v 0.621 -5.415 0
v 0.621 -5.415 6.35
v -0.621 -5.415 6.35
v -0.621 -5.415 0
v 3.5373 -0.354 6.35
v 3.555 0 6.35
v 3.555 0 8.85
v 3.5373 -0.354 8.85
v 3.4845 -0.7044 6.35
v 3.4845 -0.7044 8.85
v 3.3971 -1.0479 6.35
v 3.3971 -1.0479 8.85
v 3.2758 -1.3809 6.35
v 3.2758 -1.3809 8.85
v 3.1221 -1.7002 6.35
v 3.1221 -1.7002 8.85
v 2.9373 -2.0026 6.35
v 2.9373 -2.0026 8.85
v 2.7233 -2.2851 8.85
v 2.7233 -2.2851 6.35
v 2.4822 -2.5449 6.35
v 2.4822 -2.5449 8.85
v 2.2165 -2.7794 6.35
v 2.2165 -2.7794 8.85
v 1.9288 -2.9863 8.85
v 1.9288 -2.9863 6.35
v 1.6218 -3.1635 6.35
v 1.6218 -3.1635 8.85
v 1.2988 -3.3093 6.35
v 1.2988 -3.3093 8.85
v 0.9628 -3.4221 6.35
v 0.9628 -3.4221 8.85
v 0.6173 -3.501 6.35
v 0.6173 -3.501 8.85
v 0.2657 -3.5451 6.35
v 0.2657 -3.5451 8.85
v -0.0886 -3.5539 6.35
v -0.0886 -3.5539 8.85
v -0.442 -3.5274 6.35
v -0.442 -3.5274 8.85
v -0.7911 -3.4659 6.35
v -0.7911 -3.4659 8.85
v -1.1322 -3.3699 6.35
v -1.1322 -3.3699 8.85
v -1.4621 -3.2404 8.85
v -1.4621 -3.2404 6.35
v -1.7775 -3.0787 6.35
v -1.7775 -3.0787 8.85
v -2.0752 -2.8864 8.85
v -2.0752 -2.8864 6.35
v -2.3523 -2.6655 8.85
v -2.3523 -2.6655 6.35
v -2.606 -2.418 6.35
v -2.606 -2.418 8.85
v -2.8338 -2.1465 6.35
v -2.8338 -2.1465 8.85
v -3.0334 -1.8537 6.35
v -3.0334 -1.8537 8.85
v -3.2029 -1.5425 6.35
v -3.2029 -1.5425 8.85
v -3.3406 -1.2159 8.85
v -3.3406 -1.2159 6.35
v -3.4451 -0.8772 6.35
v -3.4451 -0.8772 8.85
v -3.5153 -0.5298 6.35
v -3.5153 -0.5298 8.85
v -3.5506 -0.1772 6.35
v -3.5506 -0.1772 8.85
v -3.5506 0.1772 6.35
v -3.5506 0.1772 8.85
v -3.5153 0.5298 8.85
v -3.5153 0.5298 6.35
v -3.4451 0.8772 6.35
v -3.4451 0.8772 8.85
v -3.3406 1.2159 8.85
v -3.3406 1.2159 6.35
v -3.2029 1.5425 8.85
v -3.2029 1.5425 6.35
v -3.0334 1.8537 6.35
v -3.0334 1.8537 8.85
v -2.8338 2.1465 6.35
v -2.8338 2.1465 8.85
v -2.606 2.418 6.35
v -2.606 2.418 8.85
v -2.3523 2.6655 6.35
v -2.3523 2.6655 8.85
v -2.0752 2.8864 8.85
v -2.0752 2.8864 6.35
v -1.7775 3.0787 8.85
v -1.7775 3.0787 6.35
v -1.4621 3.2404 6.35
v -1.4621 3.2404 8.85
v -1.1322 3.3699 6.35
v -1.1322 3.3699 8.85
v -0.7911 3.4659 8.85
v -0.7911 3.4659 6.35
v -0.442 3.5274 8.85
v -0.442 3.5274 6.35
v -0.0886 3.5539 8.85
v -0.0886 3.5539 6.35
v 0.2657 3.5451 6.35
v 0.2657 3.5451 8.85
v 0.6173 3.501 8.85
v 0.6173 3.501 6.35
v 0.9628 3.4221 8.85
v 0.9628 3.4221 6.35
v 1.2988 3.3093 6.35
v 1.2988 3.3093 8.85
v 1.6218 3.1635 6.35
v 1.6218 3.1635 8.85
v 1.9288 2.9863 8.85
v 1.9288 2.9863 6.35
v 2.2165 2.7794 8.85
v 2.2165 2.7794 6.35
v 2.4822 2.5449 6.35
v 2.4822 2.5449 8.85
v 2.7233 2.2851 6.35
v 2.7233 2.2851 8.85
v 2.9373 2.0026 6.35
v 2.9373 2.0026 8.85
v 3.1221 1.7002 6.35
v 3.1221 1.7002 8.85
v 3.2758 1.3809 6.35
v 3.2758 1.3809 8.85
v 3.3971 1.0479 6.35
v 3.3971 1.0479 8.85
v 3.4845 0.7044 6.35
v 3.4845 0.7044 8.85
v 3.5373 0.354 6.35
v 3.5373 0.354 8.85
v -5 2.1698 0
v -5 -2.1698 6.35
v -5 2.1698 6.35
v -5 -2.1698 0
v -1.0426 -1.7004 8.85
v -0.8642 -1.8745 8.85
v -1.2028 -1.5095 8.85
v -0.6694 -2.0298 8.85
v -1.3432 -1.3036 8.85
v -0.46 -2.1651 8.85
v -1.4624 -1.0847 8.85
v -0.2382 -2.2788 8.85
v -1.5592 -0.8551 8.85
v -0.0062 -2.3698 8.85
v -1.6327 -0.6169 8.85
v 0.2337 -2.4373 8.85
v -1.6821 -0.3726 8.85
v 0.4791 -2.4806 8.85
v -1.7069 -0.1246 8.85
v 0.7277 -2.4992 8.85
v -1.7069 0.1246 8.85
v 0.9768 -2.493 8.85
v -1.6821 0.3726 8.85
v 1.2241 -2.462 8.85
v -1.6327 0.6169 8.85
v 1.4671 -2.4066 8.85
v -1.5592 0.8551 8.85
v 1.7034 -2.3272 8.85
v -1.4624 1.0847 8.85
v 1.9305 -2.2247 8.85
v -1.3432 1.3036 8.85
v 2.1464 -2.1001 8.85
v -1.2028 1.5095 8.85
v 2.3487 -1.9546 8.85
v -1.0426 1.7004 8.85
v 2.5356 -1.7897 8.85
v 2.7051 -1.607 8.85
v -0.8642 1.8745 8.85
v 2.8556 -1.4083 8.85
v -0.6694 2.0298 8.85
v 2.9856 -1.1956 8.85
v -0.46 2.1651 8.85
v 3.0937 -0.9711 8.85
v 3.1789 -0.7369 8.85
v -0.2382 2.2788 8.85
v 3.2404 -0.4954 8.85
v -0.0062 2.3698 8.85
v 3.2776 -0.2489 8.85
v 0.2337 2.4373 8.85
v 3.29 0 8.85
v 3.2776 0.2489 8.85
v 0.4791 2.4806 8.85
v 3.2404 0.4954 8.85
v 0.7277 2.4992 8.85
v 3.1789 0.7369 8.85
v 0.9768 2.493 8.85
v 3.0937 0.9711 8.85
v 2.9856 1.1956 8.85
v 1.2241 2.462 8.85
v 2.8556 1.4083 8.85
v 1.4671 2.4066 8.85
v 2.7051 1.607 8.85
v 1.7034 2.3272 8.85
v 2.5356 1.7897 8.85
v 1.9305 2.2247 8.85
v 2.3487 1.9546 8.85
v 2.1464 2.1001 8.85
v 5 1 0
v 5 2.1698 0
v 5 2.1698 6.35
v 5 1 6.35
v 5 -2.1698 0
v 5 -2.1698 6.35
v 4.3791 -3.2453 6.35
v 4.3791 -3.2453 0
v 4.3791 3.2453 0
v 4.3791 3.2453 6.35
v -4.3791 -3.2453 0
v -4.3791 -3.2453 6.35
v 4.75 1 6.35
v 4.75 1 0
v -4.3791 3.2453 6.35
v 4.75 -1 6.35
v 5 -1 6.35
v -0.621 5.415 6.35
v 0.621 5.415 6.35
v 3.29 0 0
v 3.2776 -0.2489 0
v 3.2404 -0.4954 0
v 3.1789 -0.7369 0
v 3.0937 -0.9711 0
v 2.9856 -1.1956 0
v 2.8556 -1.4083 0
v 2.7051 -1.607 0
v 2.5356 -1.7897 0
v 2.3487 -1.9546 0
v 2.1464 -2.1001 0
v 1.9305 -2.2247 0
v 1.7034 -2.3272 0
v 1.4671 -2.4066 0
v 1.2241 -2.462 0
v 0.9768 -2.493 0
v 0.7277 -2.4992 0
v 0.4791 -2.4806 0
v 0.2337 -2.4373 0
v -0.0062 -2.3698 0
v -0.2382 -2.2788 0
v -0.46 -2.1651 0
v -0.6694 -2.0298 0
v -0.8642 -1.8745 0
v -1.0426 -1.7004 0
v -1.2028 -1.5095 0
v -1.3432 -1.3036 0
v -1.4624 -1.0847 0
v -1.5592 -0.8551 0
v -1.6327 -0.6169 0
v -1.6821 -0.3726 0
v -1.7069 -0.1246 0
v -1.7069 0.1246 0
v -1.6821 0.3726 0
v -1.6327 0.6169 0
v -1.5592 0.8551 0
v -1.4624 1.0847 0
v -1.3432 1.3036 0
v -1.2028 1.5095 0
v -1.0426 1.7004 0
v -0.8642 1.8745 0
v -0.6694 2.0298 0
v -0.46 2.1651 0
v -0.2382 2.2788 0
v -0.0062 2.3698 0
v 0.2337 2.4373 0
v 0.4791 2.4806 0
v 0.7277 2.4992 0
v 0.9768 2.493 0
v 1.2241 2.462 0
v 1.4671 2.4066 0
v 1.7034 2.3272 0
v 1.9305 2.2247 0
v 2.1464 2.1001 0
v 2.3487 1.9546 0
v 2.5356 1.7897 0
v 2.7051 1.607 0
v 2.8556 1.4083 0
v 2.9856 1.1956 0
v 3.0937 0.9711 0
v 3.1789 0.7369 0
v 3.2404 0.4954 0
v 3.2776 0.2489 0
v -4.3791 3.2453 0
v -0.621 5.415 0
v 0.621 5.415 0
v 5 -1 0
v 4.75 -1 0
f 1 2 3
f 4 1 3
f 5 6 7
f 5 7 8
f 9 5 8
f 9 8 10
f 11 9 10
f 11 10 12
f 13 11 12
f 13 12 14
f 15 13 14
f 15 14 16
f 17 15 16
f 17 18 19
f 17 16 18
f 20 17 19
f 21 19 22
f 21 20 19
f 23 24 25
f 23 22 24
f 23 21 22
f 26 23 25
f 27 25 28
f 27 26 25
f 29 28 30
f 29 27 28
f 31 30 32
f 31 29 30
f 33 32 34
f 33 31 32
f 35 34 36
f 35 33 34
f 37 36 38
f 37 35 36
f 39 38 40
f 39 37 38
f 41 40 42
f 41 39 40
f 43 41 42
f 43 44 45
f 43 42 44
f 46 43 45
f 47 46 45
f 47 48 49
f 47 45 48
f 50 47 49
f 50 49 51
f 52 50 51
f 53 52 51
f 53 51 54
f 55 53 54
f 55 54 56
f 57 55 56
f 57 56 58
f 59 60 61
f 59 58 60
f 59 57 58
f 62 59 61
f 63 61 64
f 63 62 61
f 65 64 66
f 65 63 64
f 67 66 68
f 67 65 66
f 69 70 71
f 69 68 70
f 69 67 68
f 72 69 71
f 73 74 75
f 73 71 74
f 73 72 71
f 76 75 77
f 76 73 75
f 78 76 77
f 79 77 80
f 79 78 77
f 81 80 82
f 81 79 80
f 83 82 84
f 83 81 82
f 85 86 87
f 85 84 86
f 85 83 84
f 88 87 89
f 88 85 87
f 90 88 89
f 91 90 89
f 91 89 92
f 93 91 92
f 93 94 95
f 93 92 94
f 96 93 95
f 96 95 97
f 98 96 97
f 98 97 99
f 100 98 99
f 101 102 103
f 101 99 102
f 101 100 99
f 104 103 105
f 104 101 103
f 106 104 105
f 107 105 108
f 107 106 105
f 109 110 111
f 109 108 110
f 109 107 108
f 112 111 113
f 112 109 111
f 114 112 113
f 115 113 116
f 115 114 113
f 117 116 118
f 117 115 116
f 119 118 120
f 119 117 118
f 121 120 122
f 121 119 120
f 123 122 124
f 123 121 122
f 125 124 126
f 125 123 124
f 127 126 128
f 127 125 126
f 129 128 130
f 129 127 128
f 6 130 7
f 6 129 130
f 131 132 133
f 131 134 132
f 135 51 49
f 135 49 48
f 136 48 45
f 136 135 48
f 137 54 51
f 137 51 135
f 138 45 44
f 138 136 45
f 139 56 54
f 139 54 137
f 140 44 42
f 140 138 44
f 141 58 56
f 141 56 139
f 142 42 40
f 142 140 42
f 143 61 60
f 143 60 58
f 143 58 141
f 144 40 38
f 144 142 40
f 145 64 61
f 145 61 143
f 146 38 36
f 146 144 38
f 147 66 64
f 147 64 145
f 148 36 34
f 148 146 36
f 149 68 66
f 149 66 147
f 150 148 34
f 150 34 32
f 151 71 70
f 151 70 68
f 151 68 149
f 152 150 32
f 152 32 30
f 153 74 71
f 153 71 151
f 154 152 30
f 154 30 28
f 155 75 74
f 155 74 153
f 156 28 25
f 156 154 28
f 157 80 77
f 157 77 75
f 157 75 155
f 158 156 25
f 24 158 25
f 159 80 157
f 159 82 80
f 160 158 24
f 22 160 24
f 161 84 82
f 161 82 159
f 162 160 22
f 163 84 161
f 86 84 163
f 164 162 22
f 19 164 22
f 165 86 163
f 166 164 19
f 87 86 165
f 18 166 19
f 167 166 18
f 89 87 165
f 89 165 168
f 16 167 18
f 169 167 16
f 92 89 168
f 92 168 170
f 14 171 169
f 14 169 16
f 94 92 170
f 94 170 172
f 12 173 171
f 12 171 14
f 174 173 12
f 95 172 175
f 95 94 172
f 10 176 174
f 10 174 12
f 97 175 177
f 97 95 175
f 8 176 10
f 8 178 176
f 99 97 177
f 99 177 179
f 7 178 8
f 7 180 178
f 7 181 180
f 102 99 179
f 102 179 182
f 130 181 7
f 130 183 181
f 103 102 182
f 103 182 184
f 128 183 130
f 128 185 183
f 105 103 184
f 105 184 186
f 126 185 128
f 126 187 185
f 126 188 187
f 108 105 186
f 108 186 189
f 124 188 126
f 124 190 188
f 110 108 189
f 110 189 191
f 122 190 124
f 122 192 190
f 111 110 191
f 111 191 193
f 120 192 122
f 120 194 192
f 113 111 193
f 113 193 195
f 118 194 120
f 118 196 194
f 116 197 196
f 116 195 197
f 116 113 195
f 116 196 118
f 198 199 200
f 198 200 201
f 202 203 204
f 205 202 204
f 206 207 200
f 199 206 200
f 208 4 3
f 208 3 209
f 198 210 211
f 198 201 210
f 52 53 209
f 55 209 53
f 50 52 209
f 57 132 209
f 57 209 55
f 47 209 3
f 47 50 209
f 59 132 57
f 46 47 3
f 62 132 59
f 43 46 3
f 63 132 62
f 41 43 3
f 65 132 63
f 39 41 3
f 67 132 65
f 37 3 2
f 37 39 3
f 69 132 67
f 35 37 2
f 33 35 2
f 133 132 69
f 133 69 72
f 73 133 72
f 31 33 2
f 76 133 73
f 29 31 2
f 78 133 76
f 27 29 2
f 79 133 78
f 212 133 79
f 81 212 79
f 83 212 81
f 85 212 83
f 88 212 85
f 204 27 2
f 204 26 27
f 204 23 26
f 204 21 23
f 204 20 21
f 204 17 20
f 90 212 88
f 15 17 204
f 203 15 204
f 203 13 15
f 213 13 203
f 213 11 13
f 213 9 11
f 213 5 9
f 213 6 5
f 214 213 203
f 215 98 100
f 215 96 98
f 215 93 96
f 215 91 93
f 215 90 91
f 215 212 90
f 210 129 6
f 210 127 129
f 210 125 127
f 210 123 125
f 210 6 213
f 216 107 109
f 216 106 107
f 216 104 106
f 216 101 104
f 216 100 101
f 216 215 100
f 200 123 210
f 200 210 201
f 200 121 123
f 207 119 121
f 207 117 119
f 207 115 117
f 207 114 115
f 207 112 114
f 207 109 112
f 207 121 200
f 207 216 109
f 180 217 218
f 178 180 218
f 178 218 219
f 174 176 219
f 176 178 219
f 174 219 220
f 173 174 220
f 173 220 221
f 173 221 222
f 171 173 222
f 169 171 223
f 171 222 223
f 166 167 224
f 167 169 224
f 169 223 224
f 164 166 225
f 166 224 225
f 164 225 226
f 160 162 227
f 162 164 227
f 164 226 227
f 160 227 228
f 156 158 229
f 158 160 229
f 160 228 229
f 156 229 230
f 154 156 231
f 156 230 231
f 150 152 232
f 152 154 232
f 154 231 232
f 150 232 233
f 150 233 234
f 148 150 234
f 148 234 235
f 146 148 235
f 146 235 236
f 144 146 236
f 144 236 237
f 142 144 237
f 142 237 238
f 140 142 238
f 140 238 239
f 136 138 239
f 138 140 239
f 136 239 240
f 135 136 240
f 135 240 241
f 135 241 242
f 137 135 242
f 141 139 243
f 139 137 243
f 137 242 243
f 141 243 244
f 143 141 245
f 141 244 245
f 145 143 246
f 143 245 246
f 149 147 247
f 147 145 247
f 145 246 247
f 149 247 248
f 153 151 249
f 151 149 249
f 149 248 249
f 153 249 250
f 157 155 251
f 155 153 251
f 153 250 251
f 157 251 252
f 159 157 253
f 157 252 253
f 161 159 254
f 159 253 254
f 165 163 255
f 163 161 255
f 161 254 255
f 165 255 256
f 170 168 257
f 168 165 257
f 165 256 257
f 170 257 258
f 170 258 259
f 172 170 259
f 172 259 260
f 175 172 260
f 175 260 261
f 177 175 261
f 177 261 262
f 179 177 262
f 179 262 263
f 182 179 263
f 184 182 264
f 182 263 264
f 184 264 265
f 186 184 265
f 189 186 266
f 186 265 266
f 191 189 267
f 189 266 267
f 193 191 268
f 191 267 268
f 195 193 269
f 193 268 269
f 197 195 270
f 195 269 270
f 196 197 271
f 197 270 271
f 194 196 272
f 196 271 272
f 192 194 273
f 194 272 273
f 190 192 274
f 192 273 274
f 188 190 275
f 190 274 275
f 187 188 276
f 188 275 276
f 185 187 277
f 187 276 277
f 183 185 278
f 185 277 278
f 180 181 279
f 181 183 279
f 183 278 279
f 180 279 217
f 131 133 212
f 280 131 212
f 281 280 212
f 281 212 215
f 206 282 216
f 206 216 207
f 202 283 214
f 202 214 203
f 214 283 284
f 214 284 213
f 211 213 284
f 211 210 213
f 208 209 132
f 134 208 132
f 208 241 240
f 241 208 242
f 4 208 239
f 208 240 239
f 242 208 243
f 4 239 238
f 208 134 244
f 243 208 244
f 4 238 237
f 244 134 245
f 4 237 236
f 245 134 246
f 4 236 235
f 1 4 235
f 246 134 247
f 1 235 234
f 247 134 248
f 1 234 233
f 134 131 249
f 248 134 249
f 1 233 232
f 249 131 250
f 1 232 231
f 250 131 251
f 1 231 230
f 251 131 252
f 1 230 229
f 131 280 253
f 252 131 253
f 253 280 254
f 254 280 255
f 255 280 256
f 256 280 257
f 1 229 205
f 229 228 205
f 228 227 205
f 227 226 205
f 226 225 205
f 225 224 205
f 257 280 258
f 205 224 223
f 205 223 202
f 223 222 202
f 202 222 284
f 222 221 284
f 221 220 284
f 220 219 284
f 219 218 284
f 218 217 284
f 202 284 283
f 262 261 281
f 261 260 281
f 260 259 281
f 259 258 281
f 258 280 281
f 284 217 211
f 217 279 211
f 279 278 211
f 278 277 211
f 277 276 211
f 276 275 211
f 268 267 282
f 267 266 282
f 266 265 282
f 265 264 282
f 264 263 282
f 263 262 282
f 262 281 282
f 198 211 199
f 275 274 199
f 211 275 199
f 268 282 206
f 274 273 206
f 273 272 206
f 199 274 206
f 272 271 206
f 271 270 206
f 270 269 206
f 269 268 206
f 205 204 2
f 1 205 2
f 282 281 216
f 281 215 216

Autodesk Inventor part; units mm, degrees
ref_plane "YZ Plane" through (0, 0, 0) normal (1, 0, 0) x (0, 1, 0)
ref_plane "XZ Plane" through (0, 0, 0) normal (0, 1, 0) x (-1, 0, 0)
ref_plane "XY Plane" through (0, 0, 0) normal (0, 0, 1) x (1, 0, 0)
sketch "Sketch1" plane through (0, 0, 0) normal (0, 0, 1) x (1, 0, 0)
  circle A0 centre (0, 0) radius 3.555
  line L0 (0, 5.7735) -> (5, 2.8868)
  line L1 (5, 2.8868) -> (5, -2.8868)
  line L2 (5, -2.8868) -> (0, -5.7735)
  line L3 (0, -5.7735) -> (-5, -2.8868)
  line L4 (-5, -2.8868) -> (-5, 2.8868)
  line L5 (-5, 2.8868) -> (0, 5.7735)
  circle A1 centre (0.79, 0) radius 2.5
  dimension "d0" = 7.11
  dimension "d2" = 10
  dimension "d3" = 5
  dimension "d4" = 0.79
extrude "Extrusion1" add sketch "Sketch1" along normal blind 6.35 contours A0 | L0 L1 L2 L3 L4 L5
sketch "Sketch2" plane through (0, 0, 6.35) normal (0, 0, 1) x (1, 0, 0)
  circle A0 centre (0.79, 0) radius 2.5 projected
  circle A1 centre (0, 0) radius 3.555
  circle A2 centre (0.79, 0) radius 2.5
  dimension "d7" = 7.11
  dimension "d9" = 5
extrude "Extrusion2" add sketch "Sketch2" along normal blind 2.5
sketch "Sketch3" plane through (5, -2.8868, 0) normal (1, 0, 0) x (0, 0, -1)
  line L0 (0, 5.7735) -> (0, 0) projected
  line L1 (-6.35, 0) -> (-6.35, 5.7735) projected
  line L2 (-6.35, 3.8868) -> (0, 3.8868)
  line L3 (0, 1.8868) -> (-6.35, 1.8868)
  line L4 (-6.35, 2.8868) -> (0, 2.8868) construction
  line L5 (-1.966, 2.8868) -> (-1.966, 3.8868) construction
  line L6 (-1.966, 2.8868) -> (-1.966, 1.8868) construction
  dimension "d13" = 2
extrude "Extrusion3" cut sketch "Sketch3" against normal blind 0.25
sketch "Sketch4" plane through (0, 0, 6.35) normal (0, 0, 1) x (1, 0, 0)
  line L0 (3.1264, 5.415) -> (6.2527, 0)
  line L1 (6.2527, 0) -> (3.1264, -5.415)
  line L2 (3.1264, -5.415) -> (-3.1264, -5.415)
  line L3 (-3.1264, -5.415) -> (-6.2527, 0)
  line L4 (-6.2527, 0) -> (-3.1264, 5.415)
  line L5 (-3.1264, 5.415) -> (3.1264, 5.415)
  line L6 (-3.1264, 5.415) -> (0, 7.4304)
  line L7 (0, 7.4304) -> (3.1264, 5.415)
  line L8 (-3.1264, 5.415) -> (-7.0189, 5.2081)
  line L9 (-7.0189, 5.2081) -> (-6.2527, 0)
  line L10 (-6.2527, 0) -> (-7.6169, -4.7381)
  line L11 (-7.6169, -4.7381) -> (-3.1264, -5.415)
  line L12 (-3.1264, -5.415) -> (-0.7756, -8.4436)
  line L13 (-0.7756, -8.4436) -> (3.1264, -5.415)
  line L14 (3.1264, -5.415) -> (7.3563, -3.9182)
  line L15 (7.3563, -3.9182) -> (6.2527, 0)
  line L16 (6.2527, 0) -> (7.7493, 2.746)
  line L17 (7.7493, 2.746) -> (3.1264, 5.415)
  point P0 (0, 0)
  point P1 (0, 0)
  dimension "d16" = 10.83
extrude "Extrusion4" cut sketch "Sketch4" against normal up to surface (6.35 mm away) contours L17 L16 L0 | L5 L6 L7 | L15 L14 L1 | L4 L9 L8 | L13 L12 L2 | L3 L11 L10
properties part number "OpenBuilds_Eccentric_Spacer"
